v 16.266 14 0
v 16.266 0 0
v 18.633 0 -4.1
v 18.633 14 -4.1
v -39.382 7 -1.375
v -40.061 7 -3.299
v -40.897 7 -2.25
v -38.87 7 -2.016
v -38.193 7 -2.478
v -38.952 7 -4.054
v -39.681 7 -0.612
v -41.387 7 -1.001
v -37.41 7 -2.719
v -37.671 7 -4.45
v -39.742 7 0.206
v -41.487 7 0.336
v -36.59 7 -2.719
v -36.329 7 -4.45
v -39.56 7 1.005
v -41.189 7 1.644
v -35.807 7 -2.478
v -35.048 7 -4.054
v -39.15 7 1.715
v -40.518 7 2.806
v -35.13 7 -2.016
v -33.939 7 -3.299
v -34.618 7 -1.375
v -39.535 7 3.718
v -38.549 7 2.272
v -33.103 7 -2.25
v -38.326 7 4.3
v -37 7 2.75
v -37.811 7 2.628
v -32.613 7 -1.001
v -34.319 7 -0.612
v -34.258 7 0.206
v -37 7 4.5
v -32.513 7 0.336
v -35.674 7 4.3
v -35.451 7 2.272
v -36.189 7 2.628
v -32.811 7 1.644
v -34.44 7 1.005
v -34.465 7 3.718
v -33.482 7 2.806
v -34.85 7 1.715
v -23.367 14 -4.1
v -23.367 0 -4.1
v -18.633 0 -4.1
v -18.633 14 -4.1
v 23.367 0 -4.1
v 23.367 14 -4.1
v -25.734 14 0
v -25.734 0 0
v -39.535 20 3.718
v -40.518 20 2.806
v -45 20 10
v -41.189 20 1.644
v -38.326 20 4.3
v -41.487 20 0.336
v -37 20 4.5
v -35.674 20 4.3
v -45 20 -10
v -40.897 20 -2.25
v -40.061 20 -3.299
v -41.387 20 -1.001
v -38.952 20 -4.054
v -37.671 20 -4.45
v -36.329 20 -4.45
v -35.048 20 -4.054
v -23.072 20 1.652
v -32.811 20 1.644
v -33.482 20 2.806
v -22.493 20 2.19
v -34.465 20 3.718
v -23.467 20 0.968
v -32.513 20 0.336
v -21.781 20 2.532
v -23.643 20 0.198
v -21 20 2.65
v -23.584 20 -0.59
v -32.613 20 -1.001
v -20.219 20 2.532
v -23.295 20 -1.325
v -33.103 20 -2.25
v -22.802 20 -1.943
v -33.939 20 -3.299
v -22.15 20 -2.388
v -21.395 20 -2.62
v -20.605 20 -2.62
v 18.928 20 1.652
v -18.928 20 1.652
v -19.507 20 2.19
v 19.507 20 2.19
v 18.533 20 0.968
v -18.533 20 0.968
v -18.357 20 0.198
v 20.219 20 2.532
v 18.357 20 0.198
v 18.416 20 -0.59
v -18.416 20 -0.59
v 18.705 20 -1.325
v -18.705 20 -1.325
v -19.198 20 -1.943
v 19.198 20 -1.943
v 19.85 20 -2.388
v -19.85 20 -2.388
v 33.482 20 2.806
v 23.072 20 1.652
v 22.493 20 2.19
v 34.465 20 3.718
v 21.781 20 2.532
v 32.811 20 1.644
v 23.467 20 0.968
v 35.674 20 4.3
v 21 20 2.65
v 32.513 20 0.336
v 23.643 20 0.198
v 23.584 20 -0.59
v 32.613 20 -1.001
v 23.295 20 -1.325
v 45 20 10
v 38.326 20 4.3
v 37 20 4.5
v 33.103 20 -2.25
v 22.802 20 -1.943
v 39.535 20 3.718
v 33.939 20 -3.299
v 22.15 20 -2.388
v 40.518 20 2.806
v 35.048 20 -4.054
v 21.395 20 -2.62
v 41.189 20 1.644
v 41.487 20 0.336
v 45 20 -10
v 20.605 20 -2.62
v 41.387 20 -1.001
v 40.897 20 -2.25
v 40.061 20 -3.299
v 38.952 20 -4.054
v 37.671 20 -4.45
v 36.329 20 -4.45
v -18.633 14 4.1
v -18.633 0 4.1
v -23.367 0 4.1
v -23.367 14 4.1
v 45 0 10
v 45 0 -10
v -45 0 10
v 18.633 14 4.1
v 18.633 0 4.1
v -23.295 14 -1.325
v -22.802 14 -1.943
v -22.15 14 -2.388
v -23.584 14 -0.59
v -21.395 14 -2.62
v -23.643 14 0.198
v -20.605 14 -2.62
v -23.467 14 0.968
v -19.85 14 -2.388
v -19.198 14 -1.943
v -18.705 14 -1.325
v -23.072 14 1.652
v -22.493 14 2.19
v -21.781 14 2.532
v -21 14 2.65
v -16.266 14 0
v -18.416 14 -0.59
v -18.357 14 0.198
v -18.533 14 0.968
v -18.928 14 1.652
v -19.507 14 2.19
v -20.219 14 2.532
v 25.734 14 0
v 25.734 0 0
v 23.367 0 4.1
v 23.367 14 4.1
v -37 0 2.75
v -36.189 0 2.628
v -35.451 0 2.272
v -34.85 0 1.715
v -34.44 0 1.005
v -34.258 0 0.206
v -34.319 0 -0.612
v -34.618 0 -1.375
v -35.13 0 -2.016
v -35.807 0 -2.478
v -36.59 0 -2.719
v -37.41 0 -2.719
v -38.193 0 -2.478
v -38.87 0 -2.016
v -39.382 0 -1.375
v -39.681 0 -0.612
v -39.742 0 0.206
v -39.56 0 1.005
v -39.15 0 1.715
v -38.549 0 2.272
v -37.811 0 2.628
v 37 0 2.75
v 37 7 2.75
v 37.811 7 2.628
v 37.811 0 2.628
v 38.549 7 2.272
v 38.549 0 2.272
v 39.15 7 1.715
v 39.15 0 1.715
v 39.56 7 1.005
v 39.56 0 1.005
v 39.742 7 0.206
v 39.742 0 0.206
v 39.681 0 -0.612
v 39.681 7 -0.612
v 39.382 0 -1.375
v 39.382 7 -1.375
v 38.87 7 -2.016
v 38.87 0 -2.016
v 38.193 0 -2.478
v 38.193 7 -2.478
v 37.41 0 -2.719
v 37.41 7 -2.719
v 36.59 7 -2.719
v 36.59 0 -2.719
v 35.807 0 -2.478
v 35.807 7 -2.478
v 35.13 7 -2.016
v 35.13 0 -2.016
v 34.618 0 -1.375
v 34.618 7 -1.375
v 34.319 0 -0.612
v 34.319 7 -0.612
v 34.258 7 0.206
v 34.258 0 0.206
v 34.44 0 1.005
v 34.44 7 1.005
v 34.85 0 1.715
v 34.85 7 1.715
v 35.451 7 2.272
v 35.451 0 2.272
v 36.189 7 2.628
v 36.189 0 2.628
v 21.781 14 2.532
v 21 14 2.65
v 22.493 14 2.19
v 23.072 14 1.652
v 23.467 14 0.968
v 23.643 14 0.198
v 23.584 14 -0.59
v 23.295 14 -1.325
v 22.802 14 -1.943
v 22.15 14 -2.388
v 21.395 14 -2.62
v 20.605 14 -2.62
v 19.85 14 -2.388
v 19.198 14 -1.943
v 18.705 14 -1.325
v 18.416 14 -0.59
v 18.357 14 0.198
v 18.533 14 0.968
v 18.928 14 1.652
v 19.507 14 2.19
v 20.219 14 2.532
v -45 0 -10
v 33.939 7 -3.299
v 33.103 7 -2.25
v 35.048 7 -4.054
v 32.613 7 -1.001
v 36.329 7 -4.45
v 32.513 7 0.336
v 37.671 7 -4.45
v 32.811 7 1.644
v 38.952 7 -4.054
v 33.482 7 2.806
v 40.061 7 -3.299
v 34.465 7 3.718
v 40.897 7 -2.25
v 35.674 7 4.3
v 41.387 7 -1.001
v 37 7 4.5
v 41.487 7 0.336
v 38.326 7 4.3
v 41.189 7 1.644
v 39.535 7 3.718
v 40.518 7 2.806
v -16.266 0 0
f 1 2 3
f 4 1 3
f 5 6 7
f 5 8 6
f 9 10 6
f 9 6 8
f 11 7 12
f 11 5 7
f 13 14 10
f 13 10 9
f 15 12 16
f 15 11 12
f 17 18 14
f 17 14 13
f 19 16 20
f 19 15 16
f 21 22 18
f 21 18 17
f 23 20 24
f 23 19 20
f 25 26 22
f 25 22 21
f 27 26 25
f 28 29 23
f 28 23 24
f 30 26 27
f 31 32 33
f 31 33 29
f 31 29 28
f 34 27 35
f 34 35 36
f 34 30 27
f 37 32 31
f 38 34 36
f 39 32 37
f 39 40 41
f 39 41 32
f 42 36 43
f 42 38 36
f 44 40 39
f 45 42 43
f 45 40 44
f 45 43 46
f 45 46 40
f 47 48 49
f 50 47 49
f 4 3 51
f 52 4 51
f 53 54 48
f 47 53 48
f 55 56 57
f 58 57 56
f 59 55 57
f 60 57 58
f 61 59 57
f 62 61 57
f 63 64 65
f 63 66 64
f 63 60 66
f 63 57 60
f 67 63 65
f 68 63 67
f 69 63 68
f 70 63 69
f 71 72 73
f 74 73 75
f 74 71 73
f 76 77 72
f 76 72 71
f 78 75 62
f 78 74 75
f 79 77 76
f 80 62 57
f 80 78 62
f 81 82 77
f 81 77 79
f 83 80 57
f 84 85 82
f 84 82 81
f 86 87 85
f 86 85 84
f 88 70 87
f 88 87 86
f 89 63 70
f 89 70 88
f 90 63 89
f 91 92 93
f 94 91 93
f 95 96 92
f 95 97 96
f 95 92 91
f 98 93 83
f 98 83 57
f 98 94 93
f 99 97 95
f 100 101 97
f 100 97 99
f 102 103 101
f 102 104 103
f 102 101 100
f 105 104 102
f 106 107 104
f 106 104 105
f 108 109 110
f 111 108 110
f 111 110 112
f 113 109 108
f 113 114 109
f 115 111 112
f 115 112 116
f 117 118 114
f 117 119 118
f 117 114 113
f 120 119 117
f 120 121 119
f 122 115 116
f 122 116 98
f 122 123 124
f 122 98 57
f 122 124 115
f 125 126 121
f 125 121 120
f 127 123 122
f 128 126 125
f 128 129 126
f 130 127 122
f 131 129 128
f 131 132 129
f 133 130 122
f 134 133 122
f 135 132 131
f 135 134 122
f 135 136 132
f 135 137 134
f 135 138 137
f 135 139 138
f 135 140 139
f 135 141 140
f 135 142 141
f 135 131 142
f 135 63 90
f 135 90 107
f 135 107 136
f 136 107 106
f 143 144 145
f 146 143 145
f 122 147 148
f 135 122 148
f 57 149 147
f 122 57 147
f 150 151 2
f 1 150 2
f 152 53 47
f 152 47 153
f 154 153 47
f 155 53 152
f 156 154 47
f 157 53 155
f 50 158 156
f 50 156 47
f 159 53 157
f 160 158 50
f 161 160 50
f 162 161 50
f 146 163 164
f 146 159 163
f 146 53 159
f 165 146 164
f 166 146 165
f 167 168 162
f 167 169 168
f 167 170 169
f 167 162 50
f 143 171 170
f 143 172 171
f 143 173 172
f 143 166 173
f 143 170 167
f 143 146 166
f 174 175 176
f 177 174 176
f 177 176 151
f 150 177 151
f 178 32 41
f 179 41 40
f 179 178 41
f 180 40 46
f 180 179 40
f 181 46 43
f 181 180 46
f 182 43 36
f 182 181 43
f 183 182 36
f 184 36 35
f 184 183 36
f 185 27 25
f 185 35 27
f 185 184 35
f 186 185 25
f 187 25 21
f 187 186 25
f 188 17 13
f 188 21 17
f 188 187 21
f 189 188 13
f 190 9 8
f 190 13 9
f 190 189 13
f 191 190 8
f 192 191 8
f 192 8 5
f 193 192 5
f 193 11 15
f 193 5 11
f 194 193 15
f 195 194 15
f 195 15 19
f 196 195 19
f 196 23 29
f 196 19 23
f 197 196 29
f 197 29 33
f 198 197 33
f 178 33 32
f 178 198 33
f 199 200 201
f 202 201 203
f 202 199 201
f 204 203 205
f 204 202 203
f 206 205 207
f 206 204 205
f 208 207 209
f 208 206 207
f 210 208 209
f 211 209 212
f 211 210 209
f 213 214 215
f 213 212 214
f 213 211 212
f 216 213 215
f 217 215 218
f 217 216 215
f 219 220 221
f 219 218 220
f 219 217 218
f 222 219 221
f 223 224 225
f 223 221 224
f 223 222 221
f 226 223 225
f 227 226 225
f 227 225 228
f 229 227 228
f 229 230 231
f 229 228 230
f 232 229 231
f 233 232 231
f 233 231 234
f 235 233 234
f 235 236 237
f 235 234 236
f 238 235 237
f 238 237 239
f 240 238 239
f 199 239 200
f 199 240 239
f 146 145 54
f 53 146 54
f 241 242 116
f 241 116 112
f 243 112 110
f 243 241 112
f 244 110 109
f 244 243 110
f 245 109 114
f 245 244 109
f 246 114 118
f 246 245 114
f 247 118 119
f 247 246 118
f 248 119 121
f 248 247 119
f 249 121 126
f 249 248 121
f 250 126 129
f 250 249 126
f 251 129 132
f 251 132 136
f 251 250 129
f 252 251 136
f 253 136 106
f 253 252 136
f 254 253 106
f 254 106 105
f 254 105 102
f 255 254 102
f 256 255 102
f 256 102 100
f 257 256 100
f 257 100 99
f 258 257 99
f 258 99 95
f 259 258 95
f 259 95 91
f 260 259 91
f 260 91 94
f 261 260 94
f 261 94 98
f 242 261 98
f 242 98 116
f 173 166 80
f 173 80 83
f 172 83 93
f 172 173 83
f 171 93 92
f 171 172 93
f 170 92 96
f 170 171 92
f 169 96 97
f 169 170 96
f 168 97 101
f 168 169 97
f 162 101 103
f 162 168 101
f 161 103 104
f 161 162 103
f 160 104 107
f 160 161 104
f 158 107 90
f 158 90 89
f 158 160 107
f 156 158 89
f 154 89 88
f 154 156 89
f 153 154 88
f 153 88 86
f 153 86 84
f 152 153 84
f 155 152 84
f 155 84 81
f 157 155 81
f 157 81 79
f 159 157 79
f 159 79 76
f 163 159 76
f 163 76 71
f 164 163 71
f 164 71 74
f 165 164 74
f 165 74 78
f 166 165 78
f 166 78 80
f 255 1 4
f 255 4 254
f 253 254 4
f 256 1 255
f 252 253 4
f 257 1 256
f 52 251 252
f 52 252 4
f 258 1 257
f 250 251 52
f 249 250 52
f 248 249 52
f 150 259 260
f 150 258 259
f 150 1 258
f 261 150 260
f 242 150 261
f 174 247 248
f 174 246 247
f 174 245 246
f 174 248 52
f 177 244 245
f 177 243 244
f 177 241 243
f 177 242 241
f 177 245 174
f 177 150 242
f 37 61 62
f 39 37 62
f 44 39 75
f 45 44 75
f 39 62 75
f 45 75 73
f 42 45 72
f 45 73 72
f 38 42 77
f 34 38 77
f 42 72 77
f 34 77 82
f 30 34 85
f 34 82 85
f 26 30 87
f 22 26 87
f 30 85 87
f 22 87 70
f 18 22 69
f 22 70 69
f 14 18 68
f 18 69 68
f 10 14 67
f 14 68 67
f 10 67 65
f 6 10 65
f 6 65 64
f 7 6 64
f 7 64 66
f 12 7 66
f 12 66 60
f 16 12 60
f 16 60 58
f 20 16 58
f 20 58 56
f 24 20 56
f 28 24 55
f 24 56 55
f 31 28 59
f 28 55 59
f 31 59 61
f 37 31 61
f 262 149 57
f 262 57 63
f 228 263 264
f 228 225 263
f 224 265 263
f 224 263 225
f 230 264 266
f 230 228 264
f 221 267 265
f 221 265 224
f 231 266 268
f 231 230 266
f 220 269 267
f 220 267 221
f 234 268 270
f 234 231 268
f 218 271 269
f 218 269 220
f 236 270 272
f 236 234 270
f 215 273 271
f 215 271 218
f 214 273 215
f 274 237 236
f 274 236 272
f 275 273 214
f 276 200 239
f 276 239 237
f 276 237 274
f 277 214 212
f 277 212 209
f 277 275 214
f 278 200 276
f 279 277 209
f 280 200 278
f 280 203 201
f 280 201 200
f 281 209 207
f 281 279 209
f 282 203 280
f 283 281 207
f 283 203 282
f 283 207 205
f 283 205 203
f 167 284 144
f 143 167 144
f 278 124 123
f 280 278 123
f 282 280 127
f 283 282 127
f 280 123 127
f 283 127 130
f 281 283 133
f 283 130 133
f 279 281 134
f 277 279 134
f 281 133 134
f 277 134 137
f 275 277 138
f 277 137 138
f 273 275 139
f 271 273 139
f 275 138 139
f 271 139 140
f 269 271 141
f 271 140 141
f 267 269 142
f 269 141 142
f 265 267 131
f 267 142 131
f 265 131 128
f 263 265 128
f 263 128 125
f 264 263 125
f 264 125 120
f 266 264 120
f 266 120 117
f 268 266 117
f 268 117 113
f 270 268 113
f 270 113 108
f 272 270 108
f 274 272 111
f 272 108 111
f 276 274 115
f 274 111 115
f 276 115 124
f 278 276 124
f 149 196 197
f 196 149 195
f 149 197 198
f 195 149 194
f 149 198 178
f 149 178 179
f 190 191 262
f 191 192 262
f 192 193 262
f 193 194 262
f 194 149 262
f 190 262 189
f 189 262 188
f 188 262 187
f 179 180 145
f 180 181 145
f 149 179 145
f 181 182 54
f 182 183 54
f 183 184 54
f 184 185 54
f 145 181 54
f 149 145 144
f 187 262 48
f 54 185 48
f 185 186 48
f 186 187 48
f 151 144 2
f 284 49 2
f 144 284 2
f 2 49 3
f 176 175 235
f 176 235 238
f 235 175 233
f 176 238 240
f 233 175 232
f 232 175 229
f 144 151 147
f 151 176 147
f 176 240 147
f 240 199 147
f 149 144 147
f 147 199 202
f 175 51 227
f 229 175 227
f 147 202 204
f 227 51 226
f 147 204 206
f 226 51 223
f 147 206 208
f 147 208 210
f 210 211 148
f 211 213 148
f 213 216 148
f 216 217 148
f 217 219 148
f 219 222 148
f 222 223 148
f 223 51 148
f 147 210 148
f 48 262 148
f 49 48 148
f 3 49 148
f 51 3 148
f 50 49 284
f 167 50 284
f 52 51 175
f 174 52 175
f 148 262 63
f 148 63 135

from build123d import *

# Parameters (mm, degrees)
SKETCH1_W           = 90
SKETCH1_H           = 20
SKETCH1_R           = 2.65
SKETCH1_R_2         = 2.75
BOSS_EXTRUDE1_DEPTH = 20
CUT_EXTRUDE1_DEPTH  = 14
SKETCH3_R           = 4.5
CUT_EXTRUDE2_DEPTH  = 13


with BuildPart() as part:
    # Sketch1 → Boss-Extrude1 (new body)
    with BuildSketch(Plane(origin=(0, 0, 0), x_dir=(1, 0, 0), z_dir=(0, 1, 0))):
        Rectangle(SKETCH1_W, SKETCH1_H)
        with Locations(Location((-21, 0, 0), (0, 0, 270))):
            Circle(SKETCH1_R, mode=Mode.SUBTRACT)
        with Locations(Location((21, 0, 0), (0, 0, 270))):
            Circle(SKETCH1_R, mode=Mode.SUBTRACT)
        with Locations(Location((-37, 0, 0), (0, 0, 270))):
            Circle(SKETCH1_R_2, mode=Mode.SUBTRACT)
        with Locations(Location((37, 0, 0), (0, 0, 270))):
            Circle(SKETCH1_R_2, mode=Mode.SUBTRACT)
    extrude(amount=BOSS_EXTRUDE1_DEPTH)

    # Sketch2 → Cut-Extrude1 (cut)
    with BuildSketch(Plane.XZ):
        Polygon((-16.265727793, 0), (-18.632863896, 4.1), (-23.367136104, 4.1), (-25.734272207, 0), (-23.367136104, -4.1), (-18.632863896, -4.1), align=None)
        Polygon((25.734272207, 0), (23.367136104, 4.1), (18.632863896, 4.1), (16.265727793, 0), (18.632863896, -4.1), (23.367136104, -4.1), align=None)
    extrude(amount=-CUT_EXTRUDE1_DEPTH, mode=Mode.SUBTRACT)

    # Sketch3 → Cut-Extrude2 (cut)
    with BuildSketch(Plane(origin=(0, 20, 0), x_dir=(1, 0, 0), z_dir=(0, 1, 0))):
        with Locations(Location((-37, 0, 0), (0, 0, 270))):
            Circle(SKETCH3_R)
        with Locations(Location((37, 0, 0), (0, 0, 270))):
            Circle(SKETCH3_R)
    extrude(amount=-CUT_EXTRUDE2_DEPTH, mode=Mode.SUBTRACT)


solid = part.part
